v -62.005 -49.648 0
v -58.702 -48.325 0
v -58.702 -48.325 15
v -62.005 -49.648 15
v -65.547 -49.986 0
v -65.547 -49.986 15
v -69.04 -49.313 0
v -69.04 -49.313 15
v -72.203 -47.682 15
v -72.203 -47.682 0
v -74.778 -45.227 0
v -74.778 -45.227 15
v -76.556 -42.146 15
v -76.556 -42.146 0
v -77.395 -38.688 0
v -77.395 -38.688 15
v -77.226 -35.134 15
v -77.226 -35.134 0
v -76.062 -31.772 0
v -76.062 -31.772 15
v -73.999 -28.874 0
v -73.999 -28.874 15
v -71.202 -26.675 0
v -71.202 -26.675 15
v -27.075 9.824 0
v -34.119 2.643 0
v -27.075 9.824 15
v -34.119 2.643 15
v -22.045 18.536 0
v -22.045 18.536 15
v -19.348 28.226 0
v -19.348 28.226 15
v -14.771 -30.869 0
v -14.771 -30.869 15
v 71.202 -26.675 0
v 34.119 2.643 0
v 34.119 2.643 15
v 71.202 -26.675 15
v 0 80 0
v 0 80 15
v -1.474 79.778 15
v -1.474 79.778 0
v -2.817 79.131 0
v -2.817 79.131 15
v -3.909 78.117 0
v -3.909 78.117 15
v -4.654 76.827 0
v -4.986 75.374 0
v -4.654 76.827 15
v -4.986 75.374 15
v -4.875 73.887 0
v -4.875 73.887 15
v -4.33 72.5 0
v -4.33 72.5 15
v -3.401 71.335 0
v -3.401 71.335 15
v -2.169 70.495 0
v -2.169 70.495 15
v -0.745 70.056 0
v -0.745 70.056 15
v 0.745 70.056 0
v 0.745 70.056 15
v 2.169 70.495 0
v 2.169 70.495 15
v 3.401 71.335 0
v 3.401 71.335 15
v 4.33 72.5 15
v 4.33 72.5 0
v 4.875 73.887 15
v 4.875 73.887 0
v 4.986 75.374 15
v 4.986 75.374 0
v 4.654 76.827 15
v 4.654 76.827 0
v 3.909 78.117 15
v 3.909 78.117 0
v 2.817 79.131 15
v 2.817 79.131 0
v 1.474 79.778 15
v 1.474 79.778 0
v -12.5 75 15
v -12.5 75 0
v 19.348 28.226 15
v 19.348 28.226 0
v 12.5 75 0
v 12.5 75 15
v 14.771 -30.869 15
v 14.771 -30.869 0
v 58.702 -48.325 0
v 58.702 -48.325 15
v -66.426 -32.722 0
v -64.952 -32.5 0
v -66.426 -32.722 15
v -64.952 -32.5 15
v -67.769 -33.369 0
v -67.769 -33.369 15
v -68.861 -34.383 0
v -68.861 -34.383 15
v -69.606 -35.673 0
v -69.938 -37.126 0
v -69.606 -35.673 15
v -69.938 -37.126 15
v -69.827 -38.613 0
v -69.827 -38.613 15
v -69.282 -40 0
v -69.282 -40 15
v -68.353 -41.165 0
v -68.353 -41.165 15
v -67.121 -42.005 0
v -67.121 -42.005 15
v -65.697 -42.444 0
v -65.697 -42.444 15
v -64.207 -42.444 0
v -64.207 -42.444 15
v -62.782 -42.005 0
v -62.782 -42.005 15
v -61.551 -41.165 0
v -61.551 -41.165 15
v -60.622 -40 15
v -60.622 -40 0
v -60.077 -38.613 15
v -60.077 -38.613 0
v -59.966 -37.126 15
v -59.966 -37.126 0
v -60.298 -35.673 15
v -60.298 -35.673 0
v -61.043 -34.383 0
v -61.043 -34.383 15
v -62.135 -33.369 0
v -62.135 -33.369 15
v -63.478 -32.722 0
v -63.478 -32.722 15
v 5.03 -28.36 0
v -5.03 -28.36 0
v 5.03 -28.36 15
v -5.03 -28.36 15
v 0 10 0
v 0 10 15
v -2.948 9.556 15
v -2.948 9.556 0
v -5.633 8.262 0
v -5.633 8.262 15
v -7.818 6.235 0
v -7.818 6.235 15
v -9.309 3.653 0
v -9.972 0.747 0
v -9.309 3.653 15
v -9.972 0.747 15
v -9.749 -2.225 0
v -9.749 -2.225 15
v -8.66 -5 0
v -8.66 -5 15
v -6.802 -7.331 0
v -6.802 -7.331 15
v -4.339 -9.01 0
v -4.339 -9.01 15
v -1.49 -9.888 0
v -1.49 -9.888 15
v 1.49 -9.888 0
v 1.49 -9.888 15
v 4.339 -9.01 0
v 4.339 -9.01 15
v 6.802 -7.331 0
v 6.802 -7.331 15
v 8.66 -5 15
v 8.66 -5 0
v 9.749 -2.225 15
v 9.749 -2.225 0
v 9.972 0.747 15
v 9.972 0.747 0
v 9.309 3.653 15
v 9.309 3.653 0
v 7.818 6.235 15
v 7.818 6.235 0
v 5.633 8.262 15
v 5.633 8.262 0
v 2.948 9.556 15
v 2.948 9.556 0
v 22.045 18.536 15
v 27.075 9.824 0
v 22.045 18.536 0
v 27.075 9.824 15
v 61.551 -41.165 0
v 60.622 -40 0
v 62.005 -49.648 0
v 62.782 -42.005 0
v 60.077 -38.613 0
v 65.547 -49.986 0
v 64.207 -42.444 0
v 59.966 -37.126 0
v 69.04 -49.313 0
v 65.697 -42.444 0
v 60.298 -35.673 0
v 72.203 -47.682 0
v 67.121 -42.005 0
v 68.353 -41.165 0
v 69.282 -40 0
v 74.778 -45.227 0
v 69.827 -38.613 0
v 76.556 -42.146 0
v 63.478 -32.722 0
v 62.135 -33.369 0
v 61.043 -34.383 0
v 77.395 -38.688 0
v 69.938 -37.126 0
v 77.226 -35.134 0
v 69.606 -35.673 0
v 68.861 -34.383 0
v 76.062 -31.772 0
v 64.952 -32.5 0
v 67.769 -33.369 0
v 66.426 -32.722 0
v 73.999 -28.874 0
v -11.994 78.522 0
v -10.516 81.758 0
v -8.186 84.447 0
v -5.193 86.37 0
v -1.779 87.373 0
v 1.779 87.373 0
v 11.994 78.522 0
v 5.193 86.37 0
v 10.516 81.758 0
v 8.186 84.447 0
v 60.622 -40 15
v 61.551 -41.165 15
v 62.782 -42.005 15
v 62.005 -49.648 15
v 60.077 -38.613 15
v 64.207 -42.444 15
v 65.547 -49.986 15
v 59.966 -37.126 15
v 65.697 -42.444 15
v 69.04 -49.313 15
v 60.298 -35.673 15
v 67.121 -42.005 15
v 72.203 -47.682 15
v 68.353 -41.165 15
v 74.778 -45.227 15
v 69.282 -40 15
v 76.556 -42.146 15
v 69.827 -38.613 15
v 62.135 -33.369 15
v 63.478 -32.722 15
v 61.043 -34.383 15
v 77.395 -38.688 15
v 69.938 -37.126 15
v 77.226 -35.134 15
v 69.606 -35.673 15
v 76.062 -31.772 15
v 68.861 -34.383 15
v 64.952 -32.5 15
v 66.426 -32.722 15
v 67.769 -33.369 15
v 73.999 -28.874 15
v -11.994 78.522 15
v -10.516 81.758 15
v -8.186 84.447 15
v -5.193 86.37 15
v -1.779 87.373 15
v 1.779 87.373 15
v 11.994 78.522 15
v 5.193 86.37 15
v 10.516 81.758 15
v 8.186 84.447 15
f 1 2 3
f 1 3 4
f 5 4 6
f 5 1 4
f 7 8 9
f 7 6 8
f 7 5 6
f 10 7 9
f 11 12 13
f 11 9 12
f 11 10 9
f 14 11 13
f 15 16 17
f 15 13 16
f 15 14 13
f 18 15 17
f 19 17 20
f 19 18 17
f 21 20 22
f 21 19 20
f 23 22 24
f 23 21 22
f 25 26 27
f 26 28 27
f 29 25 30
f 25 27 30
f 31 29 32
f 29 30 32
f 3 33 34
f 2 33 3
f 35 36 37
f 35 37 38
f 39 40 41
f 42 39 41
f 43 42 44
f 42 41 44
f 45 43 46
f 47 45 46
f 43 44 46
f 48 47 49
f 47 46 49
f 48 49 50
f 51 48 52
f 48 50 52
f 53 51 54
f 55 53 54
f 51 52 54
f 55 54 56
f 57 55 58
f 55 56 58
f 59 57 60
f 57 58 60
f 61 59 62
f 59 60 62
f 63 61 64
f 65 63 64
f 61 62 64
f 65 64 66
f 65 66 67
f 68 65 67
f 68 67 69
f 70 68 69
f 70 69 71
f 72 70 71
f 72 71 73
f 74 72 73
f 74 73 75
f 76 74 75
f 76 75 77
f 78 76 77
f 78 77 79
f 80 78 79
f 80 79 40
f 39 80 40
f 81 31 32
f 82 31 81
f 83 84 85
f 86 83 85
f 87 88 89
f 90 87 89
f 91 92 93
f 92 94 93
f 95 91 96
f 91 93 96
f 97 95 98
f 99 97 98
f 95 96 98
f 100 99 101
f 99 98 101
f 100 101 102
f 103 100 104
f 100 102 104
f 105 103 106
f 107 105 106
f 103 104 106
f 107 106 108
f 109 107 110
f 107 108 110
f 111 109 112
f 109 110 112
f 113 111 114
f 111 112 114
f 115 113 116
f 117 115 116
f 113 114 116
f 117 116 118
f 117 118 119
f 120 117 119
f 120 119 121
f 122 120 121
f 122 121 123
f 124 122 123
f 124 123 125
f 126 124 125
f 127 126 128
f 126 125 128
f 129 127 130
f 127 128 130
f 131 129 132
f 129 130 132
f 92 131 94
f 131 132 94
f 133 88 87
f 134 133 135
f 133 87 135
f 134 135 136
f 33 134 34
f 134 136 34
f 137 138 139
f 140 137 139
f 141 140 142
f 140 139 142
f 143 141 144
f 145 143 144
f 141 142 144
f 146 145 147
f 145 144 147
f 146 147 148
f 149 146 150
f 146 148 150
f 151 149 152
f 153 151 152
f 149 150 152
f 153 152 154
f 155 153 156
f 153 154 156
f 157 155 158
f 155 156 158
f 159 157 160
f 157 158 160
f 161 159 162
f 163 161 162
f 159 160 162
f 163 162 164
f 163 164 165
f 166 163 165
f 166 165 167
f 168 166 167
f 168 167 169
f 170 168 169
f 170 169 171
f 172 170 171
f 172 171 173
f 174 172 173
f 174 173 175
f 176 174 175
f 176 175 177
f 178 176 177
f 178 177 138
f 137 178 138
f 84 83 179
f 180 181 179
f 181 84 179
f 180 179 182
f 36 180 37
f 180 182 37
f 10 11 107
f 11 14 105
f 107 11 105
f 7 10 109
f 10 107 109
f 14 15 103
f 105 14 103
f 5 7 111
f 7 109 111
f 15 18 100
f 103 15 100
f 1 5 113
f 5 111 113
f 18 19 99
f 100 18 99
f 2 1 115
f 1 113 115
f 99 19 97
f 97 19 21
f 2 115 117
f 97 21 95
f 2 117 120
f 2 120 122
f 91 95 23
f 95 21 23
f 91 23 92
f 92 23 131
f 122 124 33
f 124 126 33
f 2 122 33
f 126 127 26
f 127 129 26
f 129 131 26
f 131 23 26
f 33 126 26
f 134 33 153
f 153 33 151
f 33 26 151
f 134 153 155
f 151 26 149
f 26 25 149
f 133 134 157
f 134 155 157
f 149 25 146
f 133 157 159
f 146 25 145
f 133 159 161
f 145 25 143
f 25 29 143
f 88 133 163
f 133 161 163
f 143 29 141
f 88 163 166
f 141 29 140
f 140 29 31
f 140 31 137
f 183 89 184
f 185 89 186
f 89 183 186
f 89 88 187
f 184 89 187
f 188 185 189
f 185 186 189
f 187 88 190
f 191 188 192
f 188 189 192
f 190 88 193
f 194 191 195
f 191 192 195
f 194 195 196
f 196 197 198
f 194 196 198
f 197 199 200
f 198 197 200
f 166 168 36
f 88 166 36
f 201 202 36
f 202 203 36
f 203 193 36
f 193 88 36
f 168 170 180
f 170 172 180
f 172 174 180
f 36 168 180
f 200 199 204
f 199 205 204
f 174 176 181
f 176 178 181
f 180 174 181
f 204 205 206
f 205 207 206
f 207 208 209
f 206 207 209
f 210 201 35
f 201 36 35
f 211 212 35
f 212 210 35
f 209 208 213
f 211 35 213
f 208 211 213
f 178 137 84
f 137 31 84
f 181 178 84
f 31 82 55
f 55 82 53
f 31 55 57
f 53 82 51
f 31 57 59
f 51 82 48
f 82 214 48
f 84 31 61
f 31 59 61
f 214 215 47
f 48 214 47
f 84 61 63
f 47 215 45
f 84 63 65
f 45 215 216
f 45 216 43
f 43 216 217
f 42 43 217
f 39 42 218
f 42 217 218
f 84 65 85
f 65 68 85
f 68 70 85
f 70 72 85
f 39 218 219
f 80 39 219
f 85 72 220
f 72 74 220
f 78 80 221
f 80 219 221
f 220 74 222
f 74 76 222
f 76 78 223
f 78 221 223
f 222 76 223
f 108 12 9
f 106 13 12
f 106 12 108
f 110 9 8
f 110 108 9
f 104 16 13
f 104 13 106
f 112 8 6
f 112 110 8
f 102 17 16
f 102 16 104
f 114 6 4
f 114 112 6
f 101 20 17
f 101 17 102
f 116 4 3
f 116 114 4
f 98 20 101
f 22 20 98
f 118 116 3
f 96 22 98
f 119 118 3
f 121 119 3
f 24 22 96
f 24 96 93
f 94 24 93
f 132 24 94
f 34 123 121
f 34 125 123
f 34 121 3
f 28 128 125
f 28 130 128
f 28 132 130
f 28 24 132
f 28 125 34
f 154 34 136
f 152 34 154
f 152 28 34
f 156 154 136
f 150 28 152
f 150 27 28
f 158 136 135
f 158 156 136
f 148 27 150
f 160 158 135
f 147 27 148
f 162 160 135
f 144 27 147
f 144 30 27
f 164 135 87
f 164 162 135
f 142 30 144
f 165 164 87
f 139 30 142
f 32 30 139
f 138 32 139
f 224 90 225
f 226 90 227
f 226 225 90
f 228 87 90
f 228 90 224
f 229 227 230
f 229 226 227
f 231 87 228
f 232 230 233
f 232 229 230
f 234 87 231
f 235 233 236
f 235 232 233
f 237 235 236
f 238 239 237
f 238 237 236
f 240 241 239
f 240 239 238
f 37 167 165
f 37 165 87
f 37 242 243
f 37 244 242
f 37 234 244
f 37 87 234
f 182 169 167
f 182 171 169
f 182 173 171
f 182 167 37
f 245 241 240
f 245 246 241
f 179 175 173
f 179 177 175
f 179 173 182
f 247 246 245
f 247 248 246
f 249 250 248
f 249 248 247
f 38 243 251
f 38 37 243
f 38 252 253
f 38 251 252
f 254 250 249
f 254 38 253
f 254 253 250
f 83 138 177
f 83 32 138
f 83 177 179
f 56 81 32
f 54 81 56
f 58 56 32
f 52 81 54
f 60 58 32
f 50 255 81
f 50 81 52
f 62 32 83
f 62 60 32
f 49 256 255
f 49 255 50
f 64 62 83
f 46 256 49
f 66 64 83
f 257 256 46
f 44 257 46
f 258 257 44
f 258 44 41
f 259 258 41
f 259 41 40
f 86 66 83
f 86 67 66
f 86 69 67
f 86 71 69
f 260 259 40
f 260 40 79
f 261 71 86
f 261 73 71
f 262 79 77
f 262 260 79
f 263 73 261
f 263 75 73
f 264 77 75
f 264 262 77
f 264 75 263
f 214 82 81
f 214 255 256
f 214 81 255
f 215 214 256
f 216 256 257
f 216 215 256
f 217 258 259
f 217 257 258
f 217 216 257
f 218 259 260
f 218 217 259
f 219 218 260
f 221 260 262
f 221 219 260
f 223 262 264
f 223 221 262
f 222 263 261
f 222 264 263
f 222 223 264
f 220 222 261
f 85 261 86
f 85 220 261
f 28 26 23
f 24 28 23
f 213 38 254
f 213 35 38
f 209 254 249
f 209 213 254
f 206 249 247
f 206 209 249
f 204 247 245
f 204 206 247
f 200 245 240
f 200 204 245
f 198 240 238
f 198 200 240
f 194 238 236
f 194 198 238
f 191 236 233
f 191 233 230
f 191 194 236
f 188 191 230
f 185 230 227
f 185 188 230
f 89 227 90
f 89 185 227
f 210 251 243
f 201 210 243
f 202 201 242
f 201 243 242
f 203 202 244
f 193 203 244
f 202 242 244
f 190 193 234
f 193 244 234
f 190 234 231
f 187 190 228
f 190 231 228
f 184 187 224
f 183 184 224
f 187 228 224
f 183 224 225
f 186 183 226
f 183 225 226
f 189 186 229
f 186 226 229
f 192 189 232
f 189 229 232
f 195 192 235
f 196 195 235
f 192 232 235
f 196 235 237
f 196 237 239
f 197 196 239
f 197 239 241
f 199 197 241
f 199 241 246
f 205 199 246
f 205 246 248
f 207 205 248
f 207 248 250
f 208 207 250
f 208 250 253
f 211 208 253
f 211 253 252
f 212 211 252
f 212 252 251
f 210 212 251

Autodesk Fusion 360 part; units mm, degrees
sketch "Skizze1" plane through (0, 0, 0) normal (0, 0, 1) x (1, 0, 0)
  circle A0 centre (0, 0) radius 25
  circle A1 centre (0, 75) radius 12.5
  line L0 (0, 0) -> (21.6506, 12.5) construction
  line L1 (0, 0) -> (25, 0) construction
  line L2 (21.6506, 12.5) -> (12.5, 75)
  line L3 (0, 0) -> (-21.6506, 12.5) construction
  line L4 (-21.6506, 12.5) -> (-12.5, 75)
  line L5 (0, 75) -> (0, 0) construction
  line L6 (0, 75) -> (-12.5, 75) construction
  line L7 (0, 75) -> (12.5, 75) construction
  line L8 (-21.6506, 12.5) -> (-71.2019, -26.6747)
  circle A2 centre (-64.9519, -37.5) radius 12.5
  line L9 (0, -25) -> (-58.7019, -48.3253)
  line L10 (0, -25) -> (58.7019, -48.3253)
  circle A3 centre (64.9519, -37.5) radius 12.5
  line L11 (21.6506, 12.5) -> (71.2019, -26.6747)
  dimension "d1" = 50
  dimension "d3" = 25
  dimension "d4" = 30
  dimension "d5" = 30
  dimension "d6" = 75
  dimension "d10" = 360
extrude "Extrusion1" add sketch "Skizze1" along normal blind 15
fillet "Abrundung1" radius 40 3 edges at (-21.6506, 12.5, 7.5) (0, -25, 7.5) (21.6506, 12.5, 7.5)
sketch "Skizze2" plane through (0, 0, 0) normal (0, 0, -1) x (-1, 0, 0)
  arc A0 (12.5, 75) -> (-12.5, 75) centre (0, 75) ccw
  line L0 (-12.5, 75) -> (-19.3481, 28.2264)
  arc A1 (-34.1189, 2.6428) -> (-19.3481, 28.2264) centre (-58.9262, 34.021) ccw
  line L1 (-34.1189, 2.6428) -> (-71.2019, -26.6747)
  arc A2 (-71.2019, -26.6747) -> (-58.7019, -48.3253) centre (-64.9519, -37.5) ccw
  line L2 (-58.7019, -48.3253) -> (-14.7707, -30.8692)
  arc A3 (14.7707, -30.8692) -> (-14.7707, -30.8692) centre (0, -68.0421) ccw
  line L3 (14.7707, -30.8692) -> (58.7019, -48.3253)
  arc A4 (58.7019, -48.3253) -> (71.2019, -26.6747) centre (64.9519, -37.5) ccw
  line L4 (71.2019, -26.6747) -> (34.1189, 2.6428)
  arc A5 (19.3481, 28.2264) -> (34.1189, 2.6428) centre (58.9262, 34.021) ccw
  line L5 (19.3481, 28.2264) -> (12.5, 75)
  point P0 (0, 75)
  point P1 (-64.9519, -37.5)
  point P2 (64.9519, -37.5)
hole "Bohrung1" at (0, 75, 0) at (-64.9519, -37.5, 0) at (64.9519, -37.5, 0) direction (0, 0, 1) diameter 10 end through all
sketch "Skizze4" plane through (0, 0, 0) normal (0, 0, -1) x (-1, 0, 0)
  circle A0 centre (64.9519, -37.5) radius 5
  circle A1 centre (0, 75) radius 5
  circle A2 centre (-64.9519, -37.5) radius 5
  arc A3 (12.5, 75) -> (-12.5, 75) centre (0, 75) ccw
  line L0 (-12.5, 75) -> (-19.3481, 28.2264)
  arc A4 (-34.1189, 2.6428) -> (-19.3481, 28.2264) centre (-58.9262, 34.021) ccw
  line L1 (-34.1189, 2.6428) -> (-71.2019, -26.6747)
  arc A5 (-71.2019, -26.6747) -> (-58.7019, -48.3253) centre (-64.9519, -37.5) ccw
  line L2 (-58.7019, -48.3253) -> (-14.7707, -30.8692)
  arc A6 (14.7707, -30.8692) -> (-14.7707, -30.8692) centre (0, -68.0421) ccw
  line L3 (14.7707, -30.8692) -> (58.7019, -48.3253)
  arc A7 (58.7019, -48.3253) -> (71.2019, -26.6747) centre (64.9519, -37.5) ccw
  line L4 (71.2019, -26.6747) -> (34.1189, 2.6428)
  arc A8 (19.3481, 28.2264) -> (34.1189, 2.6428) centre (58.9262, 34.021) ccw
  line L5 (19.3481, 28.2264) -> (12.5, 75)
hole "Bohrung2" at (0, 0, 0) direction (0, 0, 1) diameter 20 end through all
